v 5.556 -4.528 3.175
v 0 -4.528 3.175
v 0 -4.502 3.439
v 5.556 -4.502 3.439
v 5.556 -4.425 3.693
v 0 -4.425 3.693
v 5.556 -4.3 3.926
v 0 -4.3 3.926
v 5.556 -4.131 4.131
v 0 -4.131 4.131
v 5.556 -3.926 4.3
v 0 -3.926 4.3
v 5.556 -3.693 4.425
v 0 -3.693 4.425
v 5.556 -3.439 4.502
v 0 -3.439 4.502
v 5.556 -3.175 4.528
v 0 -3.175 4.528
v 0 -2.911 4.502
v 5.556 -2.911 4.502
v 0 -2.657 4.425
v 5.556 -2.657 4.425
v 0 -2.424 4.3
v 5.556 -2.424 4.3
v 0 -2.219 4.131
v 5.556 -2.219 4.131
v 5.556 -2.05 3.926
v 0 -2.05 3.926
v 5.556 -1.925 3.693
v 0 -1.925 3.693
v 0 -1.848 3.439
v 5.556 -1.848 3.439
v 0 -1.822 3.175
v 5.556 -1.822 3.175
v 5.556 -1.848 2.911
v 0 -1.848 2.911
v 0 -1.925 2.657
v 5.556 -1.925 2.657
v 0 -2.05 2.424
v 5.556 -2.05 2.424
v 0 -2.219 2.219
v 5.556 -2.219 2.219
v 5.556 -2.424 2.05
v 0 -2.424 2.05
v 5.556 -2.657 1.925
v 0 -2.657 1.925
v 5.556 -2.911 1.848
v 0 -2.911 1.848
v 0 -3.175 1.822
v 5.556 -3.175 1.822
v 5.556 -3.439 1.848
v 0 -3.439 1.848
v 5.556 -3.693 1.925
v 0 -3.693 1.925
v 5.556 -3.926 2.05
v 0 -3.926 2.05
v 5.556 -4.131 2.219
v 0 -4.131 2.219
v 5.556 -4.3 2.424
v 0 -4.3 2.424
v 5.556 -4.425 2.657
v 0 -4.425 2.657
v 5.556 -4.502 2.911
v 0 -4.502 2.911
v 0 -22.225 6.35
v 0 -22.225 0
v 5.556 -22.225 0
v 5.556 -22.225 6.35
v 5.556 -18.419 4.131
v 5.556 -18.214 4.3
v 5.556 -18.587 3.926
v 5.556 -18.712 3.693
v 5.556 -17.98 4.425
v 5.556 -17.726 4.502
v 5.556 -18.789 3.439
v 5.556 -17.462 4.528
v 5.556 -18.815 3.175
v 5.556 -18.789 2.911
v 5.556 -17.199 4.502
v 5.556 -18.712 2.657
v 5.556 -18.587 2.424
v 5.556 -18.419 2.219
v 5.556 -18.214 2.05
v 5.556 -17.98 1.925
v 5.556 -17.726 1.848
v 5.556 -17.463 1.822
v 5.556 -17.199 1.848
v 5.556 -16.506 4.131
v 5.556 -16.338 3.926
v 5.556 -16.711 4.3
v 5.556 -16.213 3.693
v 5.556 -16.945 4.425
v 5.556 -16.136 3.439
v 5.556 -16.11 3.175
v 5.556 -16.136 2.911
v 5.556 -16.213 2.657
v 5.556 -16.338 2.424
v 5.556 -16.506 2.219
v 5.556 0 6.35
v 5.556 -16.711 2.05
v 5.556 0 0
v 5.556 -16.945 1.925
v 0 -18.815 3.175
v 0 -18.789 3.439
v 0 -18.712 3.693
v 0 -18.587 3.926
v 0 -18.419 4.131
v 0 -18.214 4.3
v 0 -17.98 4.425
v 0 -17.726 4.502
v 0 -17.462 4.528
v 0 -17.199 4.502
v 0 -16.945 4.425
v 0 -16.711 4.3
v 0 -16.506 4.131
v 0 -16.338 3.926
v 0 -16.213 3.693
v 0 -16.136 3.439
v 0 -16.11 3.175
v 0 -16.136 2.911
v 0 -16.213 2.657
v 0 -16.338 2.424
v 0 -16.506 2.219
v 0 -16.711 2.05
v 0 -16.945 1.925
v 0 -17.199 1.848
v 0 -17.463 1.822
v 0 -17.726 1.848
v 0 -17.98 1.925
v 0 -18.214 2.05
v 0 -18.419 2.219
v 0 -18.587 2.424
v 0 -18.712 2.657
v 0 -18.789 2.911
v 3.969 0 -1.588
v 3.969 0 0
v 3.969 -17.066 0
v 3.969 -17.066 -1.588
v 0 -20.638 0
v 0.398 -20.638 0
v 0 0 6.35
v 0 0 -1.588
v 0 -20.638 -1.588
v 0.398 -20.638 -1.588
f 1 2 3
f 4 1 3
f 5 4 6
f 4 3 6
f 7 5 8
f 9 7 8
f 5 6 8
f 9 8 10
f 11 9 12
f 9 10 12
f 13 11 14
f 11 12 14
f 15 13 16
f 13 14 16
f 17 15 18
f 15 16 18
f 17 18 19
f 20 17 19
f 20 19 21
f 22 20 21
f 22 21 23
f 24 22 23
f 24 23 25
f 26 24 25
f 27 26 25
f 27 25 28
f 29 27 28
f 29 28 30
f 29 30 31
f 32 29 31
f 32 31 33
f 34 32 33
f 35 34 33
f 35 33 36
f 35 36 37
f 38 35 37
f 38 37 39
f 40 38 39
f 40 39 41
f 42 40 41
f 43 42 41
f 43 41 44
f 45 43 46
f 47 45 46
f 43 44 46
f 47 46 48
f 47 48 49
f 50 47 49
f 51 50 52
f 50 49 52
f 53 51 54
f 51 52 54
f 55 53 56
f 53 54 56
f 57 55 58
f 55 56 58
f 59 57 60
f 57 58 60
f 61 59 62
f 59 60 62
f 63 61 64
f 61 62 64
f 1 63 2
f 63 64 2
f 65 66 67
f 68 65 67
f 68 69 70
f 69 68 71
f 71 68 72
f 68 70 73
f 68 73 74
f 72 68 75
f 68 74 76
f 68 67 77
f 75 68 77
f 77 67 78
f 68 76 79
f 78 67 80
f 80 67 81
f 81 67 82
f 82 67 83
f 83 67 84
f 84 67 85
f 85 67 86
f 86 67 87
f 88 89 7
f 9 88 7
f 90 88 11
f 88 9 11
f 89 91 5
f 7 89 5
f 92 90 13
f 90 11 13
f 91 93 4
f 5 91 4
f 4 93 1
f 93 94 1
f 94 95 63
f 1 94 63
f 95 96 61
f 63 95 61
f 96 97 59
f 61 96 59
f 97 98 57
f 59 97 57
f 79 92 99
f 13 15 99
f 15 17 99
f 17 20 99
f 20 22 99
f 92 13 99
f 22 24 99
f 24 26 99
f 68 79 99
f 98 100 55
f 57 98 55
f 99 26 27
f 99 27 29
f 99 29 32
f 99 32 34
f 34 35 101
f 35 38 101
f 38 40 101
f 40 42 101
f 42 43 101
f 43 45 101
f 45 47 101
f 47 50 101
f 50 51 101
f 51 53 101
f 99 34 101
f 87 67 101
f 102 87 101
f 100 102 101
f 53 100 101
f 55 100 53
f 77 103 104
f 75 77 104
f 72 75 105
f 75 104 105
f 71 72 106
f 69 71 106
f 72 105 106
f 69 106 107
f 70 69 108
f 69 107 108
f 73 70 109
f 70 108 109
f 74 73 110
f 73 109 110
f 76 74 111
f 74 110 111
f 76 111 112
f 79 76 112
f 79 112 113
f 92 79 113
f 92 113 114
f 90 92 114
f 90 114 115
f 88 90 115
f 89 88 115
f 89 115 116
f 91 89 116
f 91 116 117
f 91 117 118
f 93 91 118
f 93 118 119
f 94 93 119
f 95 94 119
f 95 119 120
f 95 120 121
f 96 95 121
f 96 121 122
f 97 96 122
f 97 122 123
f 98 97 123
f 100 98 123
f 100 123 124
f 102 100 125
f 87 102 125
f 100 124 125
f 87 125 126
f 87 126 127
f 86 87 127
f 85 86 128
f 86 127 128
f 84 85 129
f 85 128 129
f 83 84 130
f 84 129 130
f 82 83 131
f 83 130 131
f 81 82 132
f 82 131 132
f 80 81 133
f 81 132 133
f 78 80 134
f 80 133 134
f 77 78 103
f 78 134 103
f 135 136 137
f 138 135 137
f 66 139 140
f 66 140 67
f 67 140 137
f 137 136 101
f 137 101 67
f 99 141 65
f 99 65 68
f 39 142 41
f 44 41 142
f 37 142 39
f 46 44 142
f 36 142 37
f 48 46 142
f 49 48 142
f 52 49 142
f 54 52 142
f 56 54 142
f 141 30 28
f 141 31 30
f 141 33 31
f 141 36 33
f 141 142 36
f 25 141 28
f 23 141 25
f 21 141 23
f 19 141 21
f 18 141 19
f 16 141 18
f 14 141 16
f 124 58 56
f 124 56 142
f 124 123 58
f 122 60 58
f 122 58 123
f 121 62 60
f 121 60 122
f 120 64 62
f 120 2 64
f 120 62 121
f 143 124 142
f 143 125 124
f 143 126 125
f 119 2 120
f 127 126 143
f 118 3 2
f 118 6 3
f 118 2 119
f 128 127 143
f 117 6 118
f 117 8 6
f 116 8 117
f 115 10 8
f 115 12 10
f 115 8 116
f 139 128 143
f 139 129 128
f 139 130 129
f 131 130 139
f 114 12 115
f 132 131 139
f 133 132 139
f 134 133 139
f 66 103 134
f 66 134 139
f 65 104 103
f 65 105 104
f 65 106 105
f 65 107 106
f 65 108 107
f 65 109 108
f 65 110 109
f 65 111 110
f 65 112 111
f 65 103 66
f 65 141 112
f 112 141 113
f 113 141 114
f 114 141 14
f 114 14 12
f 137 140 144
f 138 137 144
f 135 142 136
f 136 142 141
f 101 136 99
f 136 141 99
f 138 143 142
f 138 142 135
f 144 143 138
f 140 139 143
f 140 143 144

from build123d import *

# Parameters (mm, degrees)
F0_W     = 5.556377
F0_H     = 22.225
F1_DEPTH = 6.35
F2_W     = 3.968877
F2_H     = 20.6375
F3_DEPTH = 1.5875
F4_R     = 1.35255
F5_DEPTH = 6.35
F6_SIZE  = 3.57124


with BuildPart() as f1:
    # F0 (on Top) → F1 (new body)
    with BuildSketch(Plane.XY):
        with Locations((2.7781885, -11.1125)):
            Rectangle(F0_W, F0_H)
    extrude(amount=F1_DEPTH)

    # F2 (on face) → F3 (join)
    with BuildSketch(Plane(origin=(0, 0, 0), x_dir=(1, 0, 0), z_dir=(0, 0, -1))):
        with Locations((1.9844385, 10.31875)):
            Rectangle(F2_W, F2_H)
    extrude(amount=F3_DEPTH)

    # F4 (on face) → F5 (cut)
    with BuildSketch(Plane(origin=(0, 0, 0), x_dir=(0, -1, 0), z_dir=(-1, 0, 0))):
        with Locations((17.4625, 3.175)):
            Circle(F4_R)
        with Locations((3.175, 3.175)):
            Circle(F4_R)
    extrude(amount=-F5_DEPTH, mode=Mode.SUBTRACT)

    # F6
    f6_edges = [f1.edges().sort_by_distance(p)[0] for p in [
        (3.968877, -20.6375, -0.79375),
    ]]
    chamfer(f6_edges, length=F6_SIZE)


solid = f1.part
